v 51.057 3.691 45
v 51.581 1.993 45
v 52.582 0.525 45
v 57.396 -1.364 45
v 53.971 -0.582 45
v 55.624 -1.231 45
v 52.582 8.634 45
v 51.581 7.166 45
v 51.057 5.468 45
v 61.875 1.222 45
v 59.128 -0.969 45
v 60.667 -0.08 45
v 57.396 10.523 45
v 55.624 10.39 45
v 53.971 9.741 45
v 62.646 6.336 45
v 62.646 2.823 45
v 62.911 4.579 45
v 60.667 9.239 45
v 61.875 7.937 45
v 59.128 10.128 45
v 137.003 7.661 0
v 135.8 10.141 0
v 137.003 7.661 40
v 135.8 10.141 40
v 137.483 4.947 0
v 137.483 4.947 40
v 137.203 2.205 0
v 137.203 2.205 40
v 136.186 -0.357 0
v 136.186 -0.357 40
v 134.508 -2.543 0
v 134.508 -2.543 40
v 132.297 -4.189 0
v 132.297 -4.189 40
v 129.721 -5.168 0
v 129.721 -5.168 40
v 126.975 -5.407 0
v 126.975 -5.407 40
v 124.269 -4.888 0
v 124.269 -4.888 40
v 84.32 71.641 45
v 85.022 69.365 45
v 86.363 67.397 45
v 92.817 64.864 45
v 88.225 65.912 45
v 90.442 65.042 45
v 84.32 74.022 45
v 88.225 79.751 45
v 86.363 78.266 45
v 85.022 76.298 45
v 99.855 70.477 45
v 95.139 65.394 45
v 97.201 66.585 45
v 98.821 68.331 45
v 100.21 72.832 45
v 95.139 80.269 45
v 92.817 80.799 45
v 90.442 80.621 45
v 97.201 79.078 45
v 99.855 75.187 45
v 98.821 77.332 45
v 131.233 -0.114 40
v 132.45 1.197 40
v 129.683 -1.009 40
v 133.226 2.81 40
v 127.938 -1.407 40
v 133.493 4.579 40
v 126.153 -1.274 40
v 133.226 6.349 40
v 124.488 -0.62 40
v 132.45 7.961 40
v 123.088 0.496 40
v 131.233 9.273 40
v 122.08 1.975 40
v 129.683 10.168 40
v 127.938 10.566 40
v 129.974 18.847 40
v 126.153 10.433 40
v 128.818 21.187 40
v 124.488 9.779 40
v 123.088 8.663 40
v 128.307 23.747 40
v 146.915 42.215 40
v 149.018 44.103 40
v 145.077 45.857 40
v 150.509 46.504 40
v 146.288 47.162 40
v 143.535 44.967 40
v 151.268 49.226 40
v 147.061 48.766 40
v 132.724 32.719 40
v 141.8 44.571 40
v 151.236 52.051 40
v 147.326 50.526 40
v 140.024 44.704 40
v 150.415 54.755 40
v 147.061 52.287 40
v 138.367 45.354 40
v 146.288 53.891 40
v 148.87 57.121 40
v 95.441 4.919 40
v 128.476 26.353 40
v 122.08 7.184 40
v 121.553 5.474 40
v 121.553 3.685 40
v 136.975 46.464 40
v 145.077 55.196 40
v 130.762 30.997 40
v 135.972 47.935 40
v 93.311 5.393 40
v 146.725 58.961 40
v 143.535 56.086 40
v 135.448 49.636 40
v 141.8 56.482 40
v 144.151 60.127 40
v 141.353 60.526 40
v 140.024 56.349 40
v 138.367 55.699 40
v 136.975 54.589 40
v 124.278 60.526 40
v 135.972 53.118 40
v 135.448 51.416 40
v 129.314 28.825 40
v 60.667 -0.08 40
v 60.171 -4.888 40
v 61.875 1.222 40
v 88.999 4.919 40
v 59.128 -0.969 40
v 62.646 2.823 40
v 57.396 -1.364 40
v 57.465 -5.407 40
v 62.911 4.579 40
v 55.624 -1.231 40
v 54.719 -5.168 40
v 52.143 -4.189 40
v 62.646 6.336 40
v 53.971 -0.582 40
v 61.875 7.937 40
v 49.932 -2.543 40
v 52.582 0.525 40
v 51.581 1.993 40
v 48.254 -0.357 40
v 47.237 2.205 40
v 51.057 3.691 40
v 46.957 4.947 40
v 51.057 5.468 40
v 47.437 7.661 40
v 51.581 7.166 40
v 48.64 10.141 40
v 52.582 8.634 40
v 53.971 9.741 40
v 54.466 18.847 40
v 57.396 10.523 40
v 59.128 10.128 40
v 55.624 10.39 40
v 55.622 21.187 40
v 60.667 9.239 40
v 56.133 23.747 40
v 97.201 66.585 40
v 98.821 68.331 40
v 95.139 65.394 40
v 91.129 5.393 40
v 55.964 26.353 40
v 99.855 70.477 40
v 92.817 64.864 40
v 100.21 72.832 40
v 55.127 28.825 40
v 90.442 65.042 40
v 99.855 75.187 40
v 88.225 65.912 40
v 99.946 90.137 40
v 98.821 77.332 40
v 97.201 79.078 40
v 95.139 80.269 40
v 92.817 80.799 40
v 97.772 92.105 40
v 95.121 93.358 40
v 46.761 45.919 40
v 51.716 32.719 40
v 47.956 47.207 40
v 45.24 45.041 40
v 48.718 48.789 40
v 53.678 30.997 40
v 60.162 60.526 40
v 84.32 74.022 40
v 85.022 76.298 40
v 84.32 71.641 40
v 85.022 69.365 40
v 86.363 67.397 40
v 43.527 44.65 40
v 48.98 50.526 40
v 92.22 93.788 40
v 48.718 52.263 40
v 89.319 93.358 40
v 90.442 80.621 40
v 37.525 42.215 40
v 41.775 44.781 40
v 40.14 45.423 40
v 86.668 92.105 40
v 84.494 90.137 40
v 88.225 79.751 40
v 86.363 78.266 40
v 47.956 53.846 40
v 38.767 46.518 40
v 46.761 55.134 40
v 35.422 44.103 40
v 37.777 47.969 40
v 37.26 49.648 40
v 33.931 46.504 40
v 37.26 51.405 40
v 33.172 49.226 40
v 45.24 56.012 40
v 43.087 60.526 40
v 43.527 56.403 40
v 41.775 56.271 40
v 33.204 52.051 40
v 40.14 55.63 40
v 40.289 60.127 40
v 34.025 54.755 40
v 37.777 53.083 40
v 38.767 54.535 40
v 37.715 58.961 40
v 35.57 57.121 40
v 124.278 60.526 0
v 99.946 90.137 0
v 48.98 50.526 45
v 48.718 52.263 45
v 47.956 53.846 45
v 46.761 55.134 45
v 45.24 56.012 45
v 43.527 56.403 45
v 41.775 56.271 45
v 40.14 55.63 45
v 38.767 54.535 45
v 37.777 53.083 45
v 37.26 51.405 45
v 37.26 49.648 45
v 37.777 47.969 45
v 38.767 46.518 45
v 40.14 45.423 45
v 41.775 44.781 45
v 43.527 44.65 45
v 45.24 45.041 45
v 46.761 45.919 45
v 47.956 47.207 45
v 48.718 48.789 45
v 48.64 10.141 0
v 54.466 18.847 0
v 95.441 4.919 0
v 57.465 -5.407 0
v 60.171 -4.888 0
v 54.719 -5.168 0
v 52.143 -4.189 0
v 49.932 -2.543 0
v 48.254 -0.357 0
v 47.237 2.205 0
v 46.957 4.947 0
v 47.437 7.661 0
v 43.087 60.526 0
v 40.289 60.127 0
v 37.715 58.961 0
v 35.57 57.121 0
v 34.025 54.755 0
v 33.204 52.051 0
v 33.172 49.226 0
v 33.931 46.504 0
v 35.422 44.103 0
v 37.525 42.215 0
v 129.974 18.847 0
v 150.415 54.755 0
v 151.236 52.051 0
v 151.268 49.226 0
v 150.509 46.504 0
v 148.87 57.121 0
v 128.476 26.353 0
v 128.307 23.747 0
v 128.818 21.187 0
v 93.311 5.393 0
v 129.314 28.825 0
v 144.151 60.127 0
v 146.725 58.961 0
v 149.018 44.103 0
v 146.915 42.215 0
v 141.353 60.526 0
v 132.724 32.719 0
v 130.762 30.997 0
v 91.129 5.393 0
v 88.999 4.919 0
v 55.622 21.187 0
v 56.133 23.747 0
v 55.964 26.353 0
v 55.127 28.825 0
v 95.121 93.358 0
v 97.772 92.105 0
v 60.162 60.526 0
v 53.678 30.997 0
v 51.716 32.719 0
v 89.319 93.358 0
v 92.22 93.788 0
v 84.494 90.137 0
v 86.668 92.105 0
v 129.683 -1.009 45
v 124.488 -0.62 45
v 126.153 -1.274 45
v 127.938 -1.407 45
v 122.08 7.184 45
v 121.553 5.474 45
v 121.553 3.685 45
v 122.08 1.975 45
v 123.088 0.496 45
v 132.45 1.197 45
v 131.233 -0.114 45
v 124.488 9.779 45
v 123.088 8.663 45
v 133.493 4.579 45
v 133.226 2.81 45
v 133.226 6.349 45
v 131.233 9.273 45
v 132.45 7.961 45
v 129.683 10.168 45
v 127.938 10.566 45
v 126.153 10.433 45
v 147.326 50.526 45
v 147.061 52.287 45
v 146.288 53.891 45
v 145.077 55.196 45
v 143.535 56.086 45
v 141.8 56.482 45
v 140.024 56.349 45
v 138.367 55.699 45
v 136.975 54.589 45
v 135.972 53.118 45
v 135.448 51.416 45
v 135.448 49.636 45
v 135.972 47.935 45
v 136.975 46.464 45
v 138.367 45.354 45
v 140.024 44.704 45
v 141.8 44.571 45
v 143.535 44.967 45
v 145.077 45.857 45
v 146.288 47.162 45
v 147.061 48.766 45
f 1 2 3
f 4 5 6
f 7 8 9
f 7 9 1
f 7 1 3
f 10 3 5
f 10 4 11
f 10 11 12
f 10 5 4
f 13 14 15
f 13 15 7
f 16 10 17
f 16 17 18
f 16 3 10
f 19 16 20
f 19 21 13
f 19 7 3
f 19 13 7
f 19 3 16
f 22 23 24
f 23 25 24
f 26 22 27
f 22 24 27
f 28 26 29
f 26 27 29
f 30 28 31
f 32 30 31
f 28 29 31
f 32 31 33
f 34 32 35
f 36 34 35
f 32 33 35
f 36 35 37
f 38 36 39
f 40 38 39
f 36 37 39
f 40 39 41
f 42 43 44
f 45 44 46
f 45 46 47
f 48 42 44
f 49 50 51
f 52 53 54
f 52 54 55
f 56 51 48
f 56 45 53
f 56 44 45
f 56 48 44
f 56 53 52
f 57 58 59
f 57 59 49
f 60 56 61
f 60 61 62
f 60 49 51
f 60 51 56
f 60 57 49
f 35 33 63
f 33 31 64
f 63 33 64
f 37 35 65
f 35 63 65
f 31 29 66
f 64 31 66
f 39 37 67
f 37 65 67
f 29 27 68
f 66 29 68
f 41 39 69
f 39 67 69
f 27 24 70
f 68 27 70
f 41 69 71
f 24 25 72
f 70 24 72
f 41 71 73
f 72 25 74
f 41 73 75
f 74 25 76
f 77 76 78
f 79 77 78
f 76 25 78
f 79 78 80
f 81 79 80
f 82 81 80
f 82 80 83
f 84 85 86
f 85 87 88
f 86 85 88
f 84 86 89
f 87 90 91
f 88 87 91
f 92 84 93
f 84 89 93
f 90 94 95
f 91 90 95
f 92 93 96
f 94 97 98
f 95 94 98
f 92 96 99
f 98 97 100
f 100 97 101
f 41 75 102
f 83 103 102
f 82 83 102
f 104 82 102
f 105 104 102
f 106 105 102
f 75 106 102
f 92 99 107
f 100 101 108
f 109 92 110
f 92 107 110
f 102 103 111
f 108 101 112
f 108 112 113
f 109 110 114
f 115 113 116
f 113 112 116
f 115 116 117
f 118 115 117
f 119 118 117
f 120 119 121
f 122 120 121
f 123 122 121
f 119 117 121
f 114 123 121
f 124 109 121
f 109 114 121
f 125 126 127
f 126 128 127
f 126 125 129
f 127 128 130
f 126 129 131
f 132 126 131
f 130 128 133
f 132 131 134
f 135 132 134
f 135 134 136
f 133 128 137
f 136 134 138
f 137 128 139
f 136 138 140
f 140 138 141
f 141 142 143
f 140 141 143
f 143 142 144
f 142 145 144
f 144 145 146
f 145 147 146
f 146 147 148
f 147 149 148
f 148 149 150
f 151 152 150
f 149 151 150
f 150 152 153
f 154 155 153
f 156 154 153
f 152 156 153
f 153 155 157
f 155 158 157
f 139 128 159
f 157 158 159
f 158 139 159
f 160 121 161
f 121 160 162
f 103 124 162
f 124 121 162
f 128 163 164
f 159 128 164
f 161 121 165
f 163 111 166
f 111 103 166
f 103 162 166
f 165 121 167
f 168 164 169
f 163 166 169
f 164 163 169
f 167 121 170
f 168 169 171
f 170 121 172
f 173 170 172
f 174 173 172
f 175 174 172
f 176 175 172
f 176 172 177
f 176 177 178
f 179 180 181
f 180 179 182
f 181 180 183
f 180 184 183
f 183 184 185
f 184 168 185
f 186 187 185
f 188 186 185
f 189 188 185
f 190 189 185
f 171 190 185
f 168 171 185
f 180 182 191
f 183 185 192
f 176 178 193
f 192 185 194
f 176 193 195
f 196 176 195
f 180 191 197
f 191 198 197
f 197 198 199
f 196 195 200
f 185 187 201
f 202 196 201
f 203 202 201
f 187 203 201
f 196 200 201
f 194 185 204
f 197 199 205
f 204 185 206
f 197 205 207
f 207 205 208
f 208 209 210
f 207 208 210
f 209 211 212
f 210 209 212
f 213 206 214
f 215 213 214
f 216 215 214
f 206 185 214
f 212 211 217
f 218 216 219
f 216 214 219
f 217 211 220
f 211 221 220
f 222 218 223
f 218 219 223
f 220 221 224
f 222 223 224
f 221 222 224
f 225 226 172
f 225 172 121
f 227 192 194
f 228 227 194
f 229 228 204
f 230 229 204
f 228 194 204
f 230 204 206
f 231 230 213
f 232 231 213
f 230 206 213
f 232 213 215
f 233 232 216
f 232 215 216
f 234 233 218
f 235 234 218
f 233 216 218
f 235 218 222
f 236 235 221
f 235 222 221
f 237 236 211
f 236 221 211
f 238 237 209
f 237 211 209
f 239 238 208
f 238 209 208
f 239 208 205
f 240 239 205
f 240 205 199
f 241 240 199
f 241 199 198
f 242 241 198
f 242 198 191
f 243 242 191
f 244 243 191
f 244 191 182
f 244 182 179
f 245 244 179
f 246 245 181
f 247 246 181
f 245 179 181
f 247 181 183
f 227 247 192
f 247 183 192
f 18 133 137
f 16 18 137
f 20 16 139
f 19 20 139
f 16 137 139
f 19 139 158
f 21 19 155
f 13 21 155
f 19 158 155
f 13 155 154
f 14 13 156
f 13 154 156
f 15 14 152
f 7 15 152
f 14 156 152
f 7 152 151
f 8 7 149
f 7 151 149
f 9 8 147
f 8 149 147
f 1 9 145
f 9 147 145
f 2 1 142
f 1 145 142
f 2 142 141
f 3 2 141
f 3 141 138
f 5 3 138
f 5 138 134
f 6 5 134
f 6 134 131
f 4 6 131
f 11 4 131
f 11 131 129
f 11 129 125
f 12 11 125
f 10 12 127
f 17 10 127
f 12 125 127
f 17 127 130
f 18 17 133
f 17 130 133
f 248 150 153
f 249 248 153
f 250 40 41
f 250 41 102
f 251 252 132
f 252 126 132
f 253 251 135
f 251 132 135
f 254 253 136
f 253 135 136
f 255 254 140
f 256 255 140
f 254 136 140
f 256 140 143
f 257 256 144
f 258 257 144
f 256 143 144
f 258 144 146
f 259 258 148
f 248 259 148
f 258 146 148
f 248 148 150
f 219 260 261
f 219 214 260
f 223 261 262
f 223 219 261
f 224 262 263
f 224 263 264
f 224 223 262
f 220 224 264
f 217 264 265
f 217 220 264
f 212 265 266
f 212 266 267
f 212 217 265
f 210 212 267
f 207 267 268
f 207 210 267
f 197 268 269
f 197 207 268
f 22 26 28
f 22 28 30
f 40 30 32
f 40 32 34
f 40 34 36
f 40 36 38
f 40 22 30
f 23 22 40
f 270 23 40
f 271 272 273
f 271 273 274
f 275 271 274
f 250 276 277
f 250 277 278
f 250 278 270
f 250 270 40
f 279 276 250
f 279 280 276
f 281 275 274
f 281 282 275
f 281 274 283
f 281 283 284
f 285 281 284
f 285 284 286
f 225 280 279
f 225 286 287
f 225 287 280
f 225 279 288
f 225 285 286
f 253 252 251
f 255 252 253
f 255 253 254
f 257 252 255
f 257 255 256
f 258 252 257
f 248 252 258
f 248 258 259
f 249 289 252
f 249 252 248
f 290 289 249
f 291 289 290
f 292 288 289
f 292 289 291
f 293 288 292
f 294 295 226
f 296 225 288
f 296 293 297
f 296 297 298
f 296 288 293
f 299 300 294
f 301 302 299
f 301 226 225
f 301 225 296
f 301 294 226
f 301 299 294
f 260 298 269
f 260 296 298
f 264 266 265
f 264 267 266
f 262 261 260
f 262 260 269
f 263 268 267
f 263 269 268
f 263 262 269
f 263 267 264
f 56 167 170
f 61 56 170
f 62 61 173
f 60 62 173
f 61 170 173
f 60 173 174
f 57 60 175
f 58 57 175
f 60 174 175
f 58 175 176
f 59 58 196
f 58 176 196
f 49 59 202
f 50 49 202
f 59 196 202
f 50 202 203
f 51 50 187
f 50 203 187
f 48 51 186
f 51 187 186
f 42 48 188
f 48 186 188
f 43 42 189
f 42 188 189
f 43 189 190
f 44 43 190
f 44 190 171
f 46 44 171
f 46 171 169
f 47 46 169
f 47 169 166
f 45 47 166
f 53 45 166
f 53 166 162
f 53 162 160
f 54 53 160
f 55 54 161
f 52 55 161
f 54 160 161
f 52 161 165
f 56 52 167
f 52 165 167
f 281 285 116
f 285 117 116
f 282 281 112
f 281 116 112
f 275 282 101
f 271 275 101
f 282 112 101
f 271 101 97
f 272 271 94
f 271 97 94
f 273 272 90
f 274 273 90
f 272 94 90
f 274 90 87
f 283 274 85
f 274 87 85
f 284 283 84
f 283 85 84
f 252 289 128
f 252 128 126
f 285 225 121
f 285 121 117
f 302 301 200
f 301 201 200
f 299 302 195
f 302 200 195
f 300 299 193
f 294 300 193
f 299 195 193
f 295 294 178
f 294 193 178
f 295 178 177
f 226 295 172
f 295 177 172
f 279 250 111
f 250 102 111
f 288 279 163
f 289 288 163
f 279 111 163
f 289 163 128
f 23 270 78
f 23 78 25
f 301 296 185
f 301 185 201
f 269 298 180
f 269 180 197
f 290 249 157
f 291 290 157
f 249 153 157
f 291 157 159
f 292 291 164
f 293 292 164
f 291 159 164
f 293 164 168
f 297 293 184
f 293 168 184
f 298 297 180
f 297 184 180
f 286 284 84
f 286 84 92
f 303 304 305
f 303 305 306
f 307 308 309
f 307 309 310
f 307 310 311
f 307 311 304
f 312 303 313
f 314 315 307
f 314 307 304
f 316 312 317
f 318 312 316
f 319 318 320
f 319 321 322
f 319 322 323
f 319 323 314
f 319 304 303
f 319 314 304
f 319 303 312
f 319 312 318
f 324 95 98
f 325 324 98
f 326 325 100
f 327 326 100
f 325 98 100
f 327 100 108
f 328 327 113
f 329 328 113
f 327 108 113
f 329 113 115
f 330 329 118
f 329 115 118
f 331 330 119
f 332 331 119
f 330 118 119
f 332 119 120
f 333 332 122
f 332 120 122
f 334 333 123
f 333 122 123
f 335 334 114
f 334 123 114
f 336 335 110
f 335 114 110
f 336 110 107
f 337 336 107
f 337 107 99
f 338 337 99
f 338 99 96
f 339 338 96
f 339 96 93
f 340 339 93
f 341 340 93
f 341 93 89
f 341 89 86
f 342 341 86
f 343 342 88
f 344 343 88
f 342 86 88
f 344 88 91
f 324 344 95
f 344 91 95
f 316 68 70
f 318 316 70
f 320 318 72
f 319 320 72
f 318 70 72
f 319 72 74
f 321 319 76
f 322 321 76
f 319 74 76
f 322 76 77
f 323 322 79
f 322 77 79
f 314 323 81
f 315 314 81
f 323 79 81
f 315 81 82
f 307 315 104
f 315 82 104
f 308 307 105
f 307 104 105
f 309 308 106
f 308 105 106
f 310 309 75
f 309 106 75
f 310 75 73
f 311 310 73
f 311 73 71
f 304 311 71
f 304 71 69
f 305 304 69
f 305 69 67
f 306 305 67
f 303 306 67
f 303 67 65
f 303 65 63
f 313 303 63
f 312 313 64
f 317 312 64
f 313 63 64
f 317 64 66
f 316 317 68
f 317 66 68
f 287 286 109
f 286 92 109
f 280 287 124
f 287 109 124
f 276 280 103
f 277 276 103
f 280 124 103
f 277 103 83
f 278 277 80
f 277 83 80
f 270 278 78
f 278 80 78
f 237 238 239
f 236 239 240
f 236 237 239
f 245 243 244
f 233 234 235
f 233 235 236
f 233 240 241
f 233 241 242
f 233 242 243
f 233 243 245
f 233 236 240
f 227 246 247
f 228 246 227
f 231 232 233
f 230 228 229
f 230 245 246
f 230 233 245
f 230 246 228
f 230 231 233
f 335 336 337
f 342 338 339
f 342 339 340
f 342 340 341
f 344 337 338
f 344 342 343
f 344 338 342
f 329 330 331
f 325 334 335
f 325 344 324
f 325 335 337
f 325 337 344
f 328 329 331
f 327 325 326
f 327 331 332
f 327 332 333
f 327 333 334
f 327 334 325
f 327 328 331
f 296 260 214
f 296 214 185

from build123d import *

# Parameters (mm, degrees)
BOSS_EXTRUDE1_DEPTH = 40
FILLET1_R           = 10
SKETCH3_R           = 7.989564155
SKETCH3_R_2         = 5.892903955
SKETCH3_R_3         = 5.960312231
SKETCH3_R_4         = 6.003710983
SKETCH3_R_5         = 5.972502613
BOSS_EXTRUDE2_DEPTH = 5


with BuildPart() as part:
    # Sketch2 → Boss-Extrude1 (new body)
    with BuildSketch(Plane.XY):
        Polygon((10.161880784, 60.526315789), (60.161880784, 60.526315789), (92.220072964, 99.539400074), (124.278265144, 60.526315789), (174.278265144, 60.526315789), (124.413003502, 27.157832435), (152.220072964, -14.396552267), (92.220072964, 6.015037594), (32.220072964, -14.396552267), (60.027142426, 27.157832435), align=None)
    extrude(amount=BOSS_EXTRUDE1_DEPTH)

    # Fillet1
    fillet1_edges = [part.edges().sort_by_distance(p)[0] for p in [
        (10.161880784, 60.526315789, 20),
        (92.220072964, 99.539400074, 20),
        (174.278265144, 60.526315789, 20),
        (124.413003502, 27.157832435, 20),
        (152.220072964, -14.396552267, 20),
        (92.220072964, 6.015037594, 20),
        (32.220072964, -14.396552267, 20),
        (60.027142426, 27.157832435, 20),
    ]]
    fillet(fillet1_edges, radius=FILLET1_R)

    # Sketch3 → Boss-Extrude2 (add)
    with BuildSketch(Plane.XY.offset(40)):
        with Locations((92.220072964, 72.831646457)):
            Circle(SKETCH3_R)
        with Locations((43.086739991, 50.526315789)):
            Circle(SKETCH3_R_2)
        with Locations((56.950737692, 4.579469525)):
            Circle(SKETCH3_R_3)
        with Locations((127.489408235, 4.579469525)):
            Circle(SKETCH3_R_4)
        with Locations((141.353405936, 50.526315789)):
            Circle(SKETCH3_R_5)
    extrude(amount=BOSS_EXTRUDE2_DEPTH)


solid = part.part
